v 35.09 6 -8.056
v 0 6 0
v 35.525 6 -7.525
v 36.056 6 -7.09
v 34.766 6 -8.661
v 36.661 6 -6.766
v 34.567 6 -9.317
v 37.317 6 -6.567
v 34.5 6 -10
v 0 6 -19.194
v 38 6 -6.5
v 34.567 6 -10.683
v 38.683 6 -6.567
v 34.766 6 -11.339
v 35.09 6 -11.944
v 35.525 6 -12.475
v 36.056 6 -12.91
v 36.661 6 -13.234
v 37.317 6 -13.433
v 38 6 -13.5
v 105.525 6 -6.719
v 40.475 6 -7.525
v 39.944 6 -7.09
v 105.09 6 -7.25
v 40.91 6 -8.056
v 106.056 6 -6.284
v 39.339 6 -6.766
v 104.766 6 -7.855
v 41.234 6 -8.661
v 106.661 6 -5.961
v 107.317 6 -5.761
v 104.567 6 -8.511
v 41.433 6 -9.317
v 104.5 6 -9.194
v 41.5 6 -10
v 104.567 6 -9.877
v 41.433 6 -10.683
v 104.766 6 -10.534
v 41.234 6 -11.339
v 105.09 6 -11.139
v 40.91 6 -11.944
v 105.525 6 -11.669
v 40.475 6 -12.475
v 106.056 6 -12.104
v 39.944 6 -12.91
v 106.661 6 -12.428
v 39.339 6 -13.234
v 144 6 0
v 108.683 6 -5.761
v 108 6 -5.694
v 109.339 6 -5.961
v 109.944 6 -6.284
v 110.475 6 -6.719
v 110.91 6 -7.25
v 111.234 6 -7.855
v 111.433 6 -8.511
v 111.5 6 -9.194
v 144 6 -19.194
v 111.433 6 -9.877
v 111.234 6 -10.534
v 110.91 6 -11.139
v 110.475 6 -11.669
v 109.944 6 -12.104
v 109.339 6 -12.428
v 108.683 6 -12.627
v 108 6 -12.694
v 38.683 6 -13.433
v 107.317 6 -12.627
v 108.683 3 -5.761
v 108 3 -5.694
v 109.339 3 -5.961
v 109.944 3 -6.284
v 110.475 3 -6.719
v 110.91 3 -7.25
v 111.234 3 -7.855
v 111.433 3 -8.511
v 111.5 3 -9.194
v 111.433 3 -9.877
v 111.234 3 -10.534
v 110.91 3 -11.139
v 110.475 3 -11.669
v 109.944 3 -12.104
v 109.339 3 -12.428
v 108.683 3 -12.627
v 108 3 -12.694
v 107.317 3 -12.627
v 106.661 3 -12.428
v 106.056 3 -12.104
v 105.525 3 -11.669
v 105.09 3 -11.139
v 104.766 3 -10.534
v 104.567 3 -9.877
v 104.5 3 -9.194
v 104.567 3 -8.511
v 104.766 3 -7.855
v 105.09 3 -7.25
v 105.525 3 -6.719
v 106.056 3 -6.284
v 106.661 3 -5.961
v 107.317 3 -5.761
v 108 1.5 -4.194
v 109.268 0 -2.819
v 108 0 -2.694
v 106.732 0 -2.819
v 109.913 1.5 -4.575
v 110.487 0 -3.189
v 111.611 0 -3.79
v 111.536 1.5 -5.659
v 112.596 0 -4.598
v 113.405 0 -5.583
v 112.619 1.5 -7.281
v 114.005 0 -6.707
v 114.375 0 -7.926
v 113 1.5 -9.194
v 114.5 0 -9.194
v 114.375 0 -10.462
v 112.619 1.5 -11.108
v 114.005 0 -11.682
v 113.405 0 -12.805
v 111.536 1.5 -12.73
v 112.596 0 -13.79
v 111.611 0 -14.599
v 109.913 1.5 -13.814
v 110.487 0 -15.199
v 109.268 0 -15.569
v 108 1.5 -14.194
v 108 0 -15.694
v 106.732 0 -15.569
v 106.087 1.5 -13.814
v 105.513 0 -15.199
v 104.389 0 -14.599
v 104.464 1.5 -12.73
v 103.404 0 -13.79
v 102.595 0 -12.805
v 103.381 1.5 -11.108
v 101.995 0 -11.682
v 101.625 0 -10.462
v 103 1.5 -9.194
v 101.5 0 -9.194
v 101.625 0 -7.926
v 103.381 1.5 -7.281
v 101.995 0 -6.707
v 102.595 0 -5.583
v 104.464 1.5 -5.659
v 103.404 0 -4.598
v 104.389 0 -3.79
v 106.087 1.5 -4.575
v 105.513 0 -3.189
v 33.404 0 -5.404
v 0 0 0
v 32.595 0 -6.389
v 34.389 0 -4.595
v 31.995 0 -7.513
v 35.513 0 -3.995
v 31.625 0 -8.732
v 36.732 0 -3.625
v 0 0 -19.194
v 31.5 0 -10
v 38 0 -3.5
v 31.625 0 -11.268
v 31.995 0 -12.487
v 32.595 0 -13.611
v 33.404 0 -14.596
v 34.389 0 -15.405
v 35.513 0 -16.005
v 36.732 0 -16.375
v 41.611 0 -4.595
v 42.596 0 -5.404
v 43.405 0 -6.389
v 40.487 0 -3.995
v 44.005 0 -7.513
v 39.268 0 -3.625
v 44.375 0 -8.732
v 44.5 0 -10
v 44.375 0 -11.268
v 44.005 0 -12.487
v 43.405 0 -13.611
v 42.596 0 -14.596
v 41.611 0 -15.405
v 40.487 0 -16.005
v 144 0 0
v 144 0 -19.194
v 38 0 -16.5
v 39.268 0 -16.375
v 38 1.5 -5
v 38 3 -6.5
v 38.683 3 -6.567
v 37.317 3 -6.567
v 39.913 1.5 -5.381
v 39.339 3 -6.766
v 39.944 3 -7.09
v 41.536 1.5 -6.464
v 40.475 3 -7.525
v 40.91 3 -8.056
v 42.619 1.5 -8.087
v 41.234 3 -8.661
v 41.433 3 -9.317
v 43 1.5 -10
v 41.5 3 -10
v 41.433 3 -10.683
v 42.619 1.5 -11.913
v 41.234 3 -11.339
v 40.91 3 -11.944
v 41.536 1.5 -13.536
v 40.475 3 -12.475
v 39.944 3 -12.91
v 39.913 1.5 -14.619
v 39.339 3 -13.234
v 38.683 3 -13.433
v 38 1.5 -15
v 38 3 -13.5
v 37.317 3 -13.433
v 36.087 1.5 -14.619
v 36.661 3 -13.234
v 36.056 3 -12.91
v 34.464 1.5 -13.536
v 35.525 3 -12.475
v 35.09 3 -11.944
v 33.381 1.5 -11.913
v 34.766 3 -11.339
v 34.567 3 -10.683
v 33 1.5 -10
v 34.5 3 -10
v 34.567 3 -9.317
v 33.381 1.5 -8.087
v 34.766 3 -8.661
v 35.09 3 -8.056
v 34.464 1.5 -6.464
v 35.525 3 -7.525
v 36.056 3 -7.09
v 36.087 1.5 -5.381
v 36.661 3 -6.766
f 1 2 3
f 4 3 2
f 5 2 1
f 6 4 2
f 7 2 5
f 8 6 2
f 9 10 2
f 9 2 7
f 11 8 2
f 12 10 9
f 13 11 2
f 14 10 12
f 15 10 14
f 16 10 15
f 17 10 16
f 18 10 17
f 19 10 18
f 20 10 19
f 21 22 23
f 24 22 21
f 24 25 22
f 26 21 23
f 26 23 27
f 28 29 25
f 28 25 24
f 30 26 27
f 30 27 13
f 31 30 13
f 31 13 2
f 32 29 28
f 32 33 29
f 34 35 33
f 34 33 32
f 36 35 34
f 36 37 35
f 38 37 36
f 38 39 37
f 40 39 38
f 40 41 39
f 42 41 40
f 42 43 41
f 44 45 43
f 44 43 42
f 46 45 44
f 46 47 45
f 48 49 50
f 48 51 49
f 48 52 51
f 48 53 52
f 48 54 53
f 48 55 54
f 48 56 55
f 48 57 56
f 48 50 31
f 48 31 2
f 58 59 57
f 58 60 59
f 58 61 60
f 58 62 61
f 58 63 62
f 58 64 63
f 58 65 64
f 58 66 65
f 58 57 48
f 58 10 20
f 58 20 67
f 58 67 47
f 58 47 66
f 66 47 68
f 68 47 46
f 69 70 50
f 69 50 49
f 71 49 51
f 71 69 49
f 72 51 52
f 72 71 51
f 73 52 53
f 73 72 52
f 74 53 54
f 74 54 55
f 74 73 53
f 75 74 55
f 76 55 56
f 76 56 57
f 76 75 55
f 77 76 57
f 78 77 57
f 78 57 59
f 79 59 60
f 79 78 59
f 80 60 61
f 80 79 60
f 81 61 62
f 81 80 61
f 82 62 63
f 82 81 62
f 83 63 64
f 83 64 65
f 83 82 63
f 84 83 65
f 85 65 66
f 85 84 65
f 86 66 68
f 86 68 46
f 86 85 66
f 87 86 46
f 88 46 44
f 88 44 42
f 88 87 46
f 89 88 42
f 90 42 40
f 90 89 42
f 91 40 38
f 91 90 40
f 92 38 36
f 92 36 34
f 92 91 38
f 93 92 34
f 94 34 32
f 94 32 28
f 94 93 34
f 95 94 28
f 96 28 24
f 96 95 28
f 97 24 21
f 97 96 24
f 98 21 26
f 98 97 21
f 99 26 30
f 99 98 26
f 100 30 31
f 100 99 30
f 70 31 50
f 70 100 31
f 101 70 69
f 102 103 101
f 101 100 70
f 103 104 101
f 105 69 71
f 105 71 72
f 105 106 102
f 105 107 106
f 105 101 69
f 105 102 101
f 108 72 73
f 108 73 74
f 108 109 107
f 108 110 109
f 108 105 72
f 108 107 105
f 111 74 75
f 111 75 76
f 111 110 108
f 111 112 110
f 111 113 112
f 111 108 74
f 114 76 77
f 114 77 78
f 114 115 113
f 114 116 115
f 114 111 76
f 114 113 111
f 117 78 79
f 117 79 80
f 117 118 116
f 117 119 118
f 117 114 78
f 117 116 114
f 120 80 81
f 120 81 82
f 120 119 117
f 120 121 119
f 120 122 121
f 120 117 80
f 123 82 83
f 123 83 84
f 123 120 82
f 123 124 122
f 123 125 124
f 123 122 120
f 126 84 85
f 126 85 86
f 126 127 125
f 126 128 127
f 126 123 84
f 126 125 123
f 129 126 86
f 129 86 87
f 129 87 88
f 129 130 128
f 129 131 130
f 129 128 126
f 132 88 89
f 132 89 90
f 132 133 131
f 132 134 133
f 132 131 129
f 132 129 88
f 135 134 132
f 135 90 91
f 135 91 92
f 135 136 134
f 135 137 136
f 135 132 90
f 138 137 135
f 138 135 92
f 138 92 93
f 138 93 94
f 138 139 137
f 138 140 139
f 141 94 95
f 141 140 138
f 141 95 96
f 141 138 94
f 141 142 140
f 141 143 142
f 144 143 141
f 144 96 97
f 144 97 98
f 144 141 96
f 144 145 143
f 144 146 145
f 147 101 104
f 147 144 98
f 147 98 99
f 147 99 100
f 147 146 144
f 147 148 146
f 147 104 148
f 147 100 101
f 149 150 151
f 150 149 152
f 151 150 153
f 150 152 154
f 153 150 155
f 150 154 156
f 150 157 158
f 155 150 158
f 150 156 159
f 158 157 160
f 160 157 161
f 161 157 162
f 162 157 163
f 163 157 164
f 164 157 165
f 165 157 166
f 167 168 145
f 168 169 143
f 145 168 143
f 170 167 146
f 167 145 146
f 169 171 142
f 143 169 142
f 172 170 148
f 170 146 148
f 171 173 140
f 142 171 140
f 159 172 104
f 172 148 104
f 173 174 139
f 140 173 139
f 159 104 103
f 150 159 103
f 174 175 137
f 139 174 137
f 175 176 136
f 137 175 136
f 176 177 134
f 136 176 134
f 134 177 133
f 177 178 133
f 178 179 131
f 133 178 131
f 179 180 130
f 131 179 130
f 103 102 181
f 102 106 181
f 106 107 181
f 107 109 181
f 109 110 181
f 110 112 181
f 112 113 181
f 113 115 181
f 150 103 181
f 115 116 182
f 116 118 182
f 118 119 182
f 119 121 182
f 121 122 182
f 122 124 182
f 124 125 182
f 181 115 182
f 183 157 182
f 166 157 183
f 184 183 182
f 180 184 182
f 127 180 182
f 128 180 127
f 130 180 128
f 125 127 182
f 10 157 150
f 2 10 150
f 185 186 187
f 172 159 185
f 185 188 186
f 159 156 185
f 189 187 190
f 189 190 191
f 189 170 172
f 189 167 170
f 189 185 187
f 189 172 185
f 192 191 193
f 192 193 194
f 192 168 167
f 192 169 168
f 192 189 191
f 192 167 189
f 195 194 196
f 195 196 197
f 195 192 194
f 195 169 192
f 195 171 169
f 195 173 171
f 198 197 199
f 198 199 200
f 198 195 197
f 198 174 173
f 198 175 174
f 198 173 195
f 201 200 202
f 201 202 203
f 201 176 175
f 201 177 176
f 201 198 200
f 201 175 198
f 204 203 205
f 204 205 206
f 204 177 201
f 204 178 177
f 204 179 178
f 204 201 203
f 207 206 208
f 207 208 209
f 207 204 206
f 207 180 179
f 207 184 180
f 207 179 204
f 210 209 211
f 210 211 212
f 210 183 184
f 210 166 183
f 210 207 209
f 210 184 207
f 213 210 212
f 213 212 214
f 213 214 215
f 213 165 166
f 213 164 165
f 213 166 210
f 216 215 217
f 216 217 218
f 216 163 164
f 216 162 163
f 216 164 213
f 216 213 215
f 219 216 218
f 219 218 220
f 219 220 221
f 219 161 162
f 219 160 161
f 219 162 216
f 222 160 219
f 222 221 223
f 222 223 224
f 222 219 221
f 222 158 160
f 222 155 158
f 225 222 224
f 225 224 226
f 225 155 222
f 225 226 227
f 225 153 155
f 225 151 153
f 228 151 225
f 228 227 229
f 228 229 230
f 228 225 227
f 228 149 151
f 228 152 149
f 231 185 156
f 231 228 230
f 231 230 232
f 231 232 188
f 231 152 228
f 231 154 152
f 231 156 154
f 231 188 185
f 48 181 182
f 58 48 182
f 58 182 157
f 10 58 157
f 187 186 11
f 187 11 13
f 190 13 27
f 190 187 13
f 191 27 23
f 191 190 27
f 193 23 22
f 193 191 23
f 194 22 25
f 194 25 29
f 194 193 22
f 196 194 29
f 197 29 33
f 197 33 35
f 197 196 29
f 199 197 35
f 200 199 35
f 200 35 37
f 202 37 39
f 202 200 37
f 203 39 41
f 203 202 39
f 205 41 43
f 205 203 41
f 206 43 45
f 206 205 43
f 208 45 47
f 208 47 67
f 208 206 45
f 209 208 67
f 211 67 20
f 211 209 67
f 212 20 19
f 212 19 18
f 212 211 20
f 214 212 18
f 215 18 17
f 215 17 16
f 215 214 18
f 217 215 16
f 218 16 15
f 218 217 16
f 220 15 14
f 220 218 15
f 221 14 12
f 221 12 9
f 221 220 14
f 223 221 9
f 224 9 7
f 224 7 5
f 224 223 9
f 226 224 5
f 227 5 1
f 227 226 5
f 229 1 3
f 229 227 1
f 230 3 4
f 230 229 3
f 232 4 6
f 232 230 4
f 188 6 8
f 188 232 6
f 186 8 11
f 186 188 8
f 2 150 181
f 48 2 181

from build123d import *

# Parameters (mm, degrees)
SKETCH1_R           = 3.5
BOSS_EXTRUDE1_DEPTH = 6
CHAMFER1_SIZE       = 3


with BuildPart() as part:
    # Sketch1 → Boss-Extrude1 (new body)
    with BuildSketch(Plane(origin=(0, 0, 0), x_dir=(1, 0, 0), z_dir=(0, 1, 0))):
        Polygon((144, 19.194168848), (0, 19.194168848), (0, 0), (38, 0), (108, 0), (144, 0), align=None)
        with Locations(Location((108, 9.194168848, 0), (0, 0, 270))):
            Circle(SKETCH1_R, mode=Mode.SUBTRACT)
        with Locations(Location((38, 10, 0), (0, 0, 270))):
            Circle(SKETCH1_R, mode=Mode.SUBTRACT)
    extrude(amount=BOSS_EXTRUDE1_DEPTH)

    # Chamfer1
    chamfer1_edges = [part.edges().sort_by_distance(p)[0] for p in [
        (38, 0, -13.5),
        (108, 0, -12.694168848),
    ]]
    chamfer(chamfer1_edges, length=CHAMFER1_SIZE)


solid = part.part
